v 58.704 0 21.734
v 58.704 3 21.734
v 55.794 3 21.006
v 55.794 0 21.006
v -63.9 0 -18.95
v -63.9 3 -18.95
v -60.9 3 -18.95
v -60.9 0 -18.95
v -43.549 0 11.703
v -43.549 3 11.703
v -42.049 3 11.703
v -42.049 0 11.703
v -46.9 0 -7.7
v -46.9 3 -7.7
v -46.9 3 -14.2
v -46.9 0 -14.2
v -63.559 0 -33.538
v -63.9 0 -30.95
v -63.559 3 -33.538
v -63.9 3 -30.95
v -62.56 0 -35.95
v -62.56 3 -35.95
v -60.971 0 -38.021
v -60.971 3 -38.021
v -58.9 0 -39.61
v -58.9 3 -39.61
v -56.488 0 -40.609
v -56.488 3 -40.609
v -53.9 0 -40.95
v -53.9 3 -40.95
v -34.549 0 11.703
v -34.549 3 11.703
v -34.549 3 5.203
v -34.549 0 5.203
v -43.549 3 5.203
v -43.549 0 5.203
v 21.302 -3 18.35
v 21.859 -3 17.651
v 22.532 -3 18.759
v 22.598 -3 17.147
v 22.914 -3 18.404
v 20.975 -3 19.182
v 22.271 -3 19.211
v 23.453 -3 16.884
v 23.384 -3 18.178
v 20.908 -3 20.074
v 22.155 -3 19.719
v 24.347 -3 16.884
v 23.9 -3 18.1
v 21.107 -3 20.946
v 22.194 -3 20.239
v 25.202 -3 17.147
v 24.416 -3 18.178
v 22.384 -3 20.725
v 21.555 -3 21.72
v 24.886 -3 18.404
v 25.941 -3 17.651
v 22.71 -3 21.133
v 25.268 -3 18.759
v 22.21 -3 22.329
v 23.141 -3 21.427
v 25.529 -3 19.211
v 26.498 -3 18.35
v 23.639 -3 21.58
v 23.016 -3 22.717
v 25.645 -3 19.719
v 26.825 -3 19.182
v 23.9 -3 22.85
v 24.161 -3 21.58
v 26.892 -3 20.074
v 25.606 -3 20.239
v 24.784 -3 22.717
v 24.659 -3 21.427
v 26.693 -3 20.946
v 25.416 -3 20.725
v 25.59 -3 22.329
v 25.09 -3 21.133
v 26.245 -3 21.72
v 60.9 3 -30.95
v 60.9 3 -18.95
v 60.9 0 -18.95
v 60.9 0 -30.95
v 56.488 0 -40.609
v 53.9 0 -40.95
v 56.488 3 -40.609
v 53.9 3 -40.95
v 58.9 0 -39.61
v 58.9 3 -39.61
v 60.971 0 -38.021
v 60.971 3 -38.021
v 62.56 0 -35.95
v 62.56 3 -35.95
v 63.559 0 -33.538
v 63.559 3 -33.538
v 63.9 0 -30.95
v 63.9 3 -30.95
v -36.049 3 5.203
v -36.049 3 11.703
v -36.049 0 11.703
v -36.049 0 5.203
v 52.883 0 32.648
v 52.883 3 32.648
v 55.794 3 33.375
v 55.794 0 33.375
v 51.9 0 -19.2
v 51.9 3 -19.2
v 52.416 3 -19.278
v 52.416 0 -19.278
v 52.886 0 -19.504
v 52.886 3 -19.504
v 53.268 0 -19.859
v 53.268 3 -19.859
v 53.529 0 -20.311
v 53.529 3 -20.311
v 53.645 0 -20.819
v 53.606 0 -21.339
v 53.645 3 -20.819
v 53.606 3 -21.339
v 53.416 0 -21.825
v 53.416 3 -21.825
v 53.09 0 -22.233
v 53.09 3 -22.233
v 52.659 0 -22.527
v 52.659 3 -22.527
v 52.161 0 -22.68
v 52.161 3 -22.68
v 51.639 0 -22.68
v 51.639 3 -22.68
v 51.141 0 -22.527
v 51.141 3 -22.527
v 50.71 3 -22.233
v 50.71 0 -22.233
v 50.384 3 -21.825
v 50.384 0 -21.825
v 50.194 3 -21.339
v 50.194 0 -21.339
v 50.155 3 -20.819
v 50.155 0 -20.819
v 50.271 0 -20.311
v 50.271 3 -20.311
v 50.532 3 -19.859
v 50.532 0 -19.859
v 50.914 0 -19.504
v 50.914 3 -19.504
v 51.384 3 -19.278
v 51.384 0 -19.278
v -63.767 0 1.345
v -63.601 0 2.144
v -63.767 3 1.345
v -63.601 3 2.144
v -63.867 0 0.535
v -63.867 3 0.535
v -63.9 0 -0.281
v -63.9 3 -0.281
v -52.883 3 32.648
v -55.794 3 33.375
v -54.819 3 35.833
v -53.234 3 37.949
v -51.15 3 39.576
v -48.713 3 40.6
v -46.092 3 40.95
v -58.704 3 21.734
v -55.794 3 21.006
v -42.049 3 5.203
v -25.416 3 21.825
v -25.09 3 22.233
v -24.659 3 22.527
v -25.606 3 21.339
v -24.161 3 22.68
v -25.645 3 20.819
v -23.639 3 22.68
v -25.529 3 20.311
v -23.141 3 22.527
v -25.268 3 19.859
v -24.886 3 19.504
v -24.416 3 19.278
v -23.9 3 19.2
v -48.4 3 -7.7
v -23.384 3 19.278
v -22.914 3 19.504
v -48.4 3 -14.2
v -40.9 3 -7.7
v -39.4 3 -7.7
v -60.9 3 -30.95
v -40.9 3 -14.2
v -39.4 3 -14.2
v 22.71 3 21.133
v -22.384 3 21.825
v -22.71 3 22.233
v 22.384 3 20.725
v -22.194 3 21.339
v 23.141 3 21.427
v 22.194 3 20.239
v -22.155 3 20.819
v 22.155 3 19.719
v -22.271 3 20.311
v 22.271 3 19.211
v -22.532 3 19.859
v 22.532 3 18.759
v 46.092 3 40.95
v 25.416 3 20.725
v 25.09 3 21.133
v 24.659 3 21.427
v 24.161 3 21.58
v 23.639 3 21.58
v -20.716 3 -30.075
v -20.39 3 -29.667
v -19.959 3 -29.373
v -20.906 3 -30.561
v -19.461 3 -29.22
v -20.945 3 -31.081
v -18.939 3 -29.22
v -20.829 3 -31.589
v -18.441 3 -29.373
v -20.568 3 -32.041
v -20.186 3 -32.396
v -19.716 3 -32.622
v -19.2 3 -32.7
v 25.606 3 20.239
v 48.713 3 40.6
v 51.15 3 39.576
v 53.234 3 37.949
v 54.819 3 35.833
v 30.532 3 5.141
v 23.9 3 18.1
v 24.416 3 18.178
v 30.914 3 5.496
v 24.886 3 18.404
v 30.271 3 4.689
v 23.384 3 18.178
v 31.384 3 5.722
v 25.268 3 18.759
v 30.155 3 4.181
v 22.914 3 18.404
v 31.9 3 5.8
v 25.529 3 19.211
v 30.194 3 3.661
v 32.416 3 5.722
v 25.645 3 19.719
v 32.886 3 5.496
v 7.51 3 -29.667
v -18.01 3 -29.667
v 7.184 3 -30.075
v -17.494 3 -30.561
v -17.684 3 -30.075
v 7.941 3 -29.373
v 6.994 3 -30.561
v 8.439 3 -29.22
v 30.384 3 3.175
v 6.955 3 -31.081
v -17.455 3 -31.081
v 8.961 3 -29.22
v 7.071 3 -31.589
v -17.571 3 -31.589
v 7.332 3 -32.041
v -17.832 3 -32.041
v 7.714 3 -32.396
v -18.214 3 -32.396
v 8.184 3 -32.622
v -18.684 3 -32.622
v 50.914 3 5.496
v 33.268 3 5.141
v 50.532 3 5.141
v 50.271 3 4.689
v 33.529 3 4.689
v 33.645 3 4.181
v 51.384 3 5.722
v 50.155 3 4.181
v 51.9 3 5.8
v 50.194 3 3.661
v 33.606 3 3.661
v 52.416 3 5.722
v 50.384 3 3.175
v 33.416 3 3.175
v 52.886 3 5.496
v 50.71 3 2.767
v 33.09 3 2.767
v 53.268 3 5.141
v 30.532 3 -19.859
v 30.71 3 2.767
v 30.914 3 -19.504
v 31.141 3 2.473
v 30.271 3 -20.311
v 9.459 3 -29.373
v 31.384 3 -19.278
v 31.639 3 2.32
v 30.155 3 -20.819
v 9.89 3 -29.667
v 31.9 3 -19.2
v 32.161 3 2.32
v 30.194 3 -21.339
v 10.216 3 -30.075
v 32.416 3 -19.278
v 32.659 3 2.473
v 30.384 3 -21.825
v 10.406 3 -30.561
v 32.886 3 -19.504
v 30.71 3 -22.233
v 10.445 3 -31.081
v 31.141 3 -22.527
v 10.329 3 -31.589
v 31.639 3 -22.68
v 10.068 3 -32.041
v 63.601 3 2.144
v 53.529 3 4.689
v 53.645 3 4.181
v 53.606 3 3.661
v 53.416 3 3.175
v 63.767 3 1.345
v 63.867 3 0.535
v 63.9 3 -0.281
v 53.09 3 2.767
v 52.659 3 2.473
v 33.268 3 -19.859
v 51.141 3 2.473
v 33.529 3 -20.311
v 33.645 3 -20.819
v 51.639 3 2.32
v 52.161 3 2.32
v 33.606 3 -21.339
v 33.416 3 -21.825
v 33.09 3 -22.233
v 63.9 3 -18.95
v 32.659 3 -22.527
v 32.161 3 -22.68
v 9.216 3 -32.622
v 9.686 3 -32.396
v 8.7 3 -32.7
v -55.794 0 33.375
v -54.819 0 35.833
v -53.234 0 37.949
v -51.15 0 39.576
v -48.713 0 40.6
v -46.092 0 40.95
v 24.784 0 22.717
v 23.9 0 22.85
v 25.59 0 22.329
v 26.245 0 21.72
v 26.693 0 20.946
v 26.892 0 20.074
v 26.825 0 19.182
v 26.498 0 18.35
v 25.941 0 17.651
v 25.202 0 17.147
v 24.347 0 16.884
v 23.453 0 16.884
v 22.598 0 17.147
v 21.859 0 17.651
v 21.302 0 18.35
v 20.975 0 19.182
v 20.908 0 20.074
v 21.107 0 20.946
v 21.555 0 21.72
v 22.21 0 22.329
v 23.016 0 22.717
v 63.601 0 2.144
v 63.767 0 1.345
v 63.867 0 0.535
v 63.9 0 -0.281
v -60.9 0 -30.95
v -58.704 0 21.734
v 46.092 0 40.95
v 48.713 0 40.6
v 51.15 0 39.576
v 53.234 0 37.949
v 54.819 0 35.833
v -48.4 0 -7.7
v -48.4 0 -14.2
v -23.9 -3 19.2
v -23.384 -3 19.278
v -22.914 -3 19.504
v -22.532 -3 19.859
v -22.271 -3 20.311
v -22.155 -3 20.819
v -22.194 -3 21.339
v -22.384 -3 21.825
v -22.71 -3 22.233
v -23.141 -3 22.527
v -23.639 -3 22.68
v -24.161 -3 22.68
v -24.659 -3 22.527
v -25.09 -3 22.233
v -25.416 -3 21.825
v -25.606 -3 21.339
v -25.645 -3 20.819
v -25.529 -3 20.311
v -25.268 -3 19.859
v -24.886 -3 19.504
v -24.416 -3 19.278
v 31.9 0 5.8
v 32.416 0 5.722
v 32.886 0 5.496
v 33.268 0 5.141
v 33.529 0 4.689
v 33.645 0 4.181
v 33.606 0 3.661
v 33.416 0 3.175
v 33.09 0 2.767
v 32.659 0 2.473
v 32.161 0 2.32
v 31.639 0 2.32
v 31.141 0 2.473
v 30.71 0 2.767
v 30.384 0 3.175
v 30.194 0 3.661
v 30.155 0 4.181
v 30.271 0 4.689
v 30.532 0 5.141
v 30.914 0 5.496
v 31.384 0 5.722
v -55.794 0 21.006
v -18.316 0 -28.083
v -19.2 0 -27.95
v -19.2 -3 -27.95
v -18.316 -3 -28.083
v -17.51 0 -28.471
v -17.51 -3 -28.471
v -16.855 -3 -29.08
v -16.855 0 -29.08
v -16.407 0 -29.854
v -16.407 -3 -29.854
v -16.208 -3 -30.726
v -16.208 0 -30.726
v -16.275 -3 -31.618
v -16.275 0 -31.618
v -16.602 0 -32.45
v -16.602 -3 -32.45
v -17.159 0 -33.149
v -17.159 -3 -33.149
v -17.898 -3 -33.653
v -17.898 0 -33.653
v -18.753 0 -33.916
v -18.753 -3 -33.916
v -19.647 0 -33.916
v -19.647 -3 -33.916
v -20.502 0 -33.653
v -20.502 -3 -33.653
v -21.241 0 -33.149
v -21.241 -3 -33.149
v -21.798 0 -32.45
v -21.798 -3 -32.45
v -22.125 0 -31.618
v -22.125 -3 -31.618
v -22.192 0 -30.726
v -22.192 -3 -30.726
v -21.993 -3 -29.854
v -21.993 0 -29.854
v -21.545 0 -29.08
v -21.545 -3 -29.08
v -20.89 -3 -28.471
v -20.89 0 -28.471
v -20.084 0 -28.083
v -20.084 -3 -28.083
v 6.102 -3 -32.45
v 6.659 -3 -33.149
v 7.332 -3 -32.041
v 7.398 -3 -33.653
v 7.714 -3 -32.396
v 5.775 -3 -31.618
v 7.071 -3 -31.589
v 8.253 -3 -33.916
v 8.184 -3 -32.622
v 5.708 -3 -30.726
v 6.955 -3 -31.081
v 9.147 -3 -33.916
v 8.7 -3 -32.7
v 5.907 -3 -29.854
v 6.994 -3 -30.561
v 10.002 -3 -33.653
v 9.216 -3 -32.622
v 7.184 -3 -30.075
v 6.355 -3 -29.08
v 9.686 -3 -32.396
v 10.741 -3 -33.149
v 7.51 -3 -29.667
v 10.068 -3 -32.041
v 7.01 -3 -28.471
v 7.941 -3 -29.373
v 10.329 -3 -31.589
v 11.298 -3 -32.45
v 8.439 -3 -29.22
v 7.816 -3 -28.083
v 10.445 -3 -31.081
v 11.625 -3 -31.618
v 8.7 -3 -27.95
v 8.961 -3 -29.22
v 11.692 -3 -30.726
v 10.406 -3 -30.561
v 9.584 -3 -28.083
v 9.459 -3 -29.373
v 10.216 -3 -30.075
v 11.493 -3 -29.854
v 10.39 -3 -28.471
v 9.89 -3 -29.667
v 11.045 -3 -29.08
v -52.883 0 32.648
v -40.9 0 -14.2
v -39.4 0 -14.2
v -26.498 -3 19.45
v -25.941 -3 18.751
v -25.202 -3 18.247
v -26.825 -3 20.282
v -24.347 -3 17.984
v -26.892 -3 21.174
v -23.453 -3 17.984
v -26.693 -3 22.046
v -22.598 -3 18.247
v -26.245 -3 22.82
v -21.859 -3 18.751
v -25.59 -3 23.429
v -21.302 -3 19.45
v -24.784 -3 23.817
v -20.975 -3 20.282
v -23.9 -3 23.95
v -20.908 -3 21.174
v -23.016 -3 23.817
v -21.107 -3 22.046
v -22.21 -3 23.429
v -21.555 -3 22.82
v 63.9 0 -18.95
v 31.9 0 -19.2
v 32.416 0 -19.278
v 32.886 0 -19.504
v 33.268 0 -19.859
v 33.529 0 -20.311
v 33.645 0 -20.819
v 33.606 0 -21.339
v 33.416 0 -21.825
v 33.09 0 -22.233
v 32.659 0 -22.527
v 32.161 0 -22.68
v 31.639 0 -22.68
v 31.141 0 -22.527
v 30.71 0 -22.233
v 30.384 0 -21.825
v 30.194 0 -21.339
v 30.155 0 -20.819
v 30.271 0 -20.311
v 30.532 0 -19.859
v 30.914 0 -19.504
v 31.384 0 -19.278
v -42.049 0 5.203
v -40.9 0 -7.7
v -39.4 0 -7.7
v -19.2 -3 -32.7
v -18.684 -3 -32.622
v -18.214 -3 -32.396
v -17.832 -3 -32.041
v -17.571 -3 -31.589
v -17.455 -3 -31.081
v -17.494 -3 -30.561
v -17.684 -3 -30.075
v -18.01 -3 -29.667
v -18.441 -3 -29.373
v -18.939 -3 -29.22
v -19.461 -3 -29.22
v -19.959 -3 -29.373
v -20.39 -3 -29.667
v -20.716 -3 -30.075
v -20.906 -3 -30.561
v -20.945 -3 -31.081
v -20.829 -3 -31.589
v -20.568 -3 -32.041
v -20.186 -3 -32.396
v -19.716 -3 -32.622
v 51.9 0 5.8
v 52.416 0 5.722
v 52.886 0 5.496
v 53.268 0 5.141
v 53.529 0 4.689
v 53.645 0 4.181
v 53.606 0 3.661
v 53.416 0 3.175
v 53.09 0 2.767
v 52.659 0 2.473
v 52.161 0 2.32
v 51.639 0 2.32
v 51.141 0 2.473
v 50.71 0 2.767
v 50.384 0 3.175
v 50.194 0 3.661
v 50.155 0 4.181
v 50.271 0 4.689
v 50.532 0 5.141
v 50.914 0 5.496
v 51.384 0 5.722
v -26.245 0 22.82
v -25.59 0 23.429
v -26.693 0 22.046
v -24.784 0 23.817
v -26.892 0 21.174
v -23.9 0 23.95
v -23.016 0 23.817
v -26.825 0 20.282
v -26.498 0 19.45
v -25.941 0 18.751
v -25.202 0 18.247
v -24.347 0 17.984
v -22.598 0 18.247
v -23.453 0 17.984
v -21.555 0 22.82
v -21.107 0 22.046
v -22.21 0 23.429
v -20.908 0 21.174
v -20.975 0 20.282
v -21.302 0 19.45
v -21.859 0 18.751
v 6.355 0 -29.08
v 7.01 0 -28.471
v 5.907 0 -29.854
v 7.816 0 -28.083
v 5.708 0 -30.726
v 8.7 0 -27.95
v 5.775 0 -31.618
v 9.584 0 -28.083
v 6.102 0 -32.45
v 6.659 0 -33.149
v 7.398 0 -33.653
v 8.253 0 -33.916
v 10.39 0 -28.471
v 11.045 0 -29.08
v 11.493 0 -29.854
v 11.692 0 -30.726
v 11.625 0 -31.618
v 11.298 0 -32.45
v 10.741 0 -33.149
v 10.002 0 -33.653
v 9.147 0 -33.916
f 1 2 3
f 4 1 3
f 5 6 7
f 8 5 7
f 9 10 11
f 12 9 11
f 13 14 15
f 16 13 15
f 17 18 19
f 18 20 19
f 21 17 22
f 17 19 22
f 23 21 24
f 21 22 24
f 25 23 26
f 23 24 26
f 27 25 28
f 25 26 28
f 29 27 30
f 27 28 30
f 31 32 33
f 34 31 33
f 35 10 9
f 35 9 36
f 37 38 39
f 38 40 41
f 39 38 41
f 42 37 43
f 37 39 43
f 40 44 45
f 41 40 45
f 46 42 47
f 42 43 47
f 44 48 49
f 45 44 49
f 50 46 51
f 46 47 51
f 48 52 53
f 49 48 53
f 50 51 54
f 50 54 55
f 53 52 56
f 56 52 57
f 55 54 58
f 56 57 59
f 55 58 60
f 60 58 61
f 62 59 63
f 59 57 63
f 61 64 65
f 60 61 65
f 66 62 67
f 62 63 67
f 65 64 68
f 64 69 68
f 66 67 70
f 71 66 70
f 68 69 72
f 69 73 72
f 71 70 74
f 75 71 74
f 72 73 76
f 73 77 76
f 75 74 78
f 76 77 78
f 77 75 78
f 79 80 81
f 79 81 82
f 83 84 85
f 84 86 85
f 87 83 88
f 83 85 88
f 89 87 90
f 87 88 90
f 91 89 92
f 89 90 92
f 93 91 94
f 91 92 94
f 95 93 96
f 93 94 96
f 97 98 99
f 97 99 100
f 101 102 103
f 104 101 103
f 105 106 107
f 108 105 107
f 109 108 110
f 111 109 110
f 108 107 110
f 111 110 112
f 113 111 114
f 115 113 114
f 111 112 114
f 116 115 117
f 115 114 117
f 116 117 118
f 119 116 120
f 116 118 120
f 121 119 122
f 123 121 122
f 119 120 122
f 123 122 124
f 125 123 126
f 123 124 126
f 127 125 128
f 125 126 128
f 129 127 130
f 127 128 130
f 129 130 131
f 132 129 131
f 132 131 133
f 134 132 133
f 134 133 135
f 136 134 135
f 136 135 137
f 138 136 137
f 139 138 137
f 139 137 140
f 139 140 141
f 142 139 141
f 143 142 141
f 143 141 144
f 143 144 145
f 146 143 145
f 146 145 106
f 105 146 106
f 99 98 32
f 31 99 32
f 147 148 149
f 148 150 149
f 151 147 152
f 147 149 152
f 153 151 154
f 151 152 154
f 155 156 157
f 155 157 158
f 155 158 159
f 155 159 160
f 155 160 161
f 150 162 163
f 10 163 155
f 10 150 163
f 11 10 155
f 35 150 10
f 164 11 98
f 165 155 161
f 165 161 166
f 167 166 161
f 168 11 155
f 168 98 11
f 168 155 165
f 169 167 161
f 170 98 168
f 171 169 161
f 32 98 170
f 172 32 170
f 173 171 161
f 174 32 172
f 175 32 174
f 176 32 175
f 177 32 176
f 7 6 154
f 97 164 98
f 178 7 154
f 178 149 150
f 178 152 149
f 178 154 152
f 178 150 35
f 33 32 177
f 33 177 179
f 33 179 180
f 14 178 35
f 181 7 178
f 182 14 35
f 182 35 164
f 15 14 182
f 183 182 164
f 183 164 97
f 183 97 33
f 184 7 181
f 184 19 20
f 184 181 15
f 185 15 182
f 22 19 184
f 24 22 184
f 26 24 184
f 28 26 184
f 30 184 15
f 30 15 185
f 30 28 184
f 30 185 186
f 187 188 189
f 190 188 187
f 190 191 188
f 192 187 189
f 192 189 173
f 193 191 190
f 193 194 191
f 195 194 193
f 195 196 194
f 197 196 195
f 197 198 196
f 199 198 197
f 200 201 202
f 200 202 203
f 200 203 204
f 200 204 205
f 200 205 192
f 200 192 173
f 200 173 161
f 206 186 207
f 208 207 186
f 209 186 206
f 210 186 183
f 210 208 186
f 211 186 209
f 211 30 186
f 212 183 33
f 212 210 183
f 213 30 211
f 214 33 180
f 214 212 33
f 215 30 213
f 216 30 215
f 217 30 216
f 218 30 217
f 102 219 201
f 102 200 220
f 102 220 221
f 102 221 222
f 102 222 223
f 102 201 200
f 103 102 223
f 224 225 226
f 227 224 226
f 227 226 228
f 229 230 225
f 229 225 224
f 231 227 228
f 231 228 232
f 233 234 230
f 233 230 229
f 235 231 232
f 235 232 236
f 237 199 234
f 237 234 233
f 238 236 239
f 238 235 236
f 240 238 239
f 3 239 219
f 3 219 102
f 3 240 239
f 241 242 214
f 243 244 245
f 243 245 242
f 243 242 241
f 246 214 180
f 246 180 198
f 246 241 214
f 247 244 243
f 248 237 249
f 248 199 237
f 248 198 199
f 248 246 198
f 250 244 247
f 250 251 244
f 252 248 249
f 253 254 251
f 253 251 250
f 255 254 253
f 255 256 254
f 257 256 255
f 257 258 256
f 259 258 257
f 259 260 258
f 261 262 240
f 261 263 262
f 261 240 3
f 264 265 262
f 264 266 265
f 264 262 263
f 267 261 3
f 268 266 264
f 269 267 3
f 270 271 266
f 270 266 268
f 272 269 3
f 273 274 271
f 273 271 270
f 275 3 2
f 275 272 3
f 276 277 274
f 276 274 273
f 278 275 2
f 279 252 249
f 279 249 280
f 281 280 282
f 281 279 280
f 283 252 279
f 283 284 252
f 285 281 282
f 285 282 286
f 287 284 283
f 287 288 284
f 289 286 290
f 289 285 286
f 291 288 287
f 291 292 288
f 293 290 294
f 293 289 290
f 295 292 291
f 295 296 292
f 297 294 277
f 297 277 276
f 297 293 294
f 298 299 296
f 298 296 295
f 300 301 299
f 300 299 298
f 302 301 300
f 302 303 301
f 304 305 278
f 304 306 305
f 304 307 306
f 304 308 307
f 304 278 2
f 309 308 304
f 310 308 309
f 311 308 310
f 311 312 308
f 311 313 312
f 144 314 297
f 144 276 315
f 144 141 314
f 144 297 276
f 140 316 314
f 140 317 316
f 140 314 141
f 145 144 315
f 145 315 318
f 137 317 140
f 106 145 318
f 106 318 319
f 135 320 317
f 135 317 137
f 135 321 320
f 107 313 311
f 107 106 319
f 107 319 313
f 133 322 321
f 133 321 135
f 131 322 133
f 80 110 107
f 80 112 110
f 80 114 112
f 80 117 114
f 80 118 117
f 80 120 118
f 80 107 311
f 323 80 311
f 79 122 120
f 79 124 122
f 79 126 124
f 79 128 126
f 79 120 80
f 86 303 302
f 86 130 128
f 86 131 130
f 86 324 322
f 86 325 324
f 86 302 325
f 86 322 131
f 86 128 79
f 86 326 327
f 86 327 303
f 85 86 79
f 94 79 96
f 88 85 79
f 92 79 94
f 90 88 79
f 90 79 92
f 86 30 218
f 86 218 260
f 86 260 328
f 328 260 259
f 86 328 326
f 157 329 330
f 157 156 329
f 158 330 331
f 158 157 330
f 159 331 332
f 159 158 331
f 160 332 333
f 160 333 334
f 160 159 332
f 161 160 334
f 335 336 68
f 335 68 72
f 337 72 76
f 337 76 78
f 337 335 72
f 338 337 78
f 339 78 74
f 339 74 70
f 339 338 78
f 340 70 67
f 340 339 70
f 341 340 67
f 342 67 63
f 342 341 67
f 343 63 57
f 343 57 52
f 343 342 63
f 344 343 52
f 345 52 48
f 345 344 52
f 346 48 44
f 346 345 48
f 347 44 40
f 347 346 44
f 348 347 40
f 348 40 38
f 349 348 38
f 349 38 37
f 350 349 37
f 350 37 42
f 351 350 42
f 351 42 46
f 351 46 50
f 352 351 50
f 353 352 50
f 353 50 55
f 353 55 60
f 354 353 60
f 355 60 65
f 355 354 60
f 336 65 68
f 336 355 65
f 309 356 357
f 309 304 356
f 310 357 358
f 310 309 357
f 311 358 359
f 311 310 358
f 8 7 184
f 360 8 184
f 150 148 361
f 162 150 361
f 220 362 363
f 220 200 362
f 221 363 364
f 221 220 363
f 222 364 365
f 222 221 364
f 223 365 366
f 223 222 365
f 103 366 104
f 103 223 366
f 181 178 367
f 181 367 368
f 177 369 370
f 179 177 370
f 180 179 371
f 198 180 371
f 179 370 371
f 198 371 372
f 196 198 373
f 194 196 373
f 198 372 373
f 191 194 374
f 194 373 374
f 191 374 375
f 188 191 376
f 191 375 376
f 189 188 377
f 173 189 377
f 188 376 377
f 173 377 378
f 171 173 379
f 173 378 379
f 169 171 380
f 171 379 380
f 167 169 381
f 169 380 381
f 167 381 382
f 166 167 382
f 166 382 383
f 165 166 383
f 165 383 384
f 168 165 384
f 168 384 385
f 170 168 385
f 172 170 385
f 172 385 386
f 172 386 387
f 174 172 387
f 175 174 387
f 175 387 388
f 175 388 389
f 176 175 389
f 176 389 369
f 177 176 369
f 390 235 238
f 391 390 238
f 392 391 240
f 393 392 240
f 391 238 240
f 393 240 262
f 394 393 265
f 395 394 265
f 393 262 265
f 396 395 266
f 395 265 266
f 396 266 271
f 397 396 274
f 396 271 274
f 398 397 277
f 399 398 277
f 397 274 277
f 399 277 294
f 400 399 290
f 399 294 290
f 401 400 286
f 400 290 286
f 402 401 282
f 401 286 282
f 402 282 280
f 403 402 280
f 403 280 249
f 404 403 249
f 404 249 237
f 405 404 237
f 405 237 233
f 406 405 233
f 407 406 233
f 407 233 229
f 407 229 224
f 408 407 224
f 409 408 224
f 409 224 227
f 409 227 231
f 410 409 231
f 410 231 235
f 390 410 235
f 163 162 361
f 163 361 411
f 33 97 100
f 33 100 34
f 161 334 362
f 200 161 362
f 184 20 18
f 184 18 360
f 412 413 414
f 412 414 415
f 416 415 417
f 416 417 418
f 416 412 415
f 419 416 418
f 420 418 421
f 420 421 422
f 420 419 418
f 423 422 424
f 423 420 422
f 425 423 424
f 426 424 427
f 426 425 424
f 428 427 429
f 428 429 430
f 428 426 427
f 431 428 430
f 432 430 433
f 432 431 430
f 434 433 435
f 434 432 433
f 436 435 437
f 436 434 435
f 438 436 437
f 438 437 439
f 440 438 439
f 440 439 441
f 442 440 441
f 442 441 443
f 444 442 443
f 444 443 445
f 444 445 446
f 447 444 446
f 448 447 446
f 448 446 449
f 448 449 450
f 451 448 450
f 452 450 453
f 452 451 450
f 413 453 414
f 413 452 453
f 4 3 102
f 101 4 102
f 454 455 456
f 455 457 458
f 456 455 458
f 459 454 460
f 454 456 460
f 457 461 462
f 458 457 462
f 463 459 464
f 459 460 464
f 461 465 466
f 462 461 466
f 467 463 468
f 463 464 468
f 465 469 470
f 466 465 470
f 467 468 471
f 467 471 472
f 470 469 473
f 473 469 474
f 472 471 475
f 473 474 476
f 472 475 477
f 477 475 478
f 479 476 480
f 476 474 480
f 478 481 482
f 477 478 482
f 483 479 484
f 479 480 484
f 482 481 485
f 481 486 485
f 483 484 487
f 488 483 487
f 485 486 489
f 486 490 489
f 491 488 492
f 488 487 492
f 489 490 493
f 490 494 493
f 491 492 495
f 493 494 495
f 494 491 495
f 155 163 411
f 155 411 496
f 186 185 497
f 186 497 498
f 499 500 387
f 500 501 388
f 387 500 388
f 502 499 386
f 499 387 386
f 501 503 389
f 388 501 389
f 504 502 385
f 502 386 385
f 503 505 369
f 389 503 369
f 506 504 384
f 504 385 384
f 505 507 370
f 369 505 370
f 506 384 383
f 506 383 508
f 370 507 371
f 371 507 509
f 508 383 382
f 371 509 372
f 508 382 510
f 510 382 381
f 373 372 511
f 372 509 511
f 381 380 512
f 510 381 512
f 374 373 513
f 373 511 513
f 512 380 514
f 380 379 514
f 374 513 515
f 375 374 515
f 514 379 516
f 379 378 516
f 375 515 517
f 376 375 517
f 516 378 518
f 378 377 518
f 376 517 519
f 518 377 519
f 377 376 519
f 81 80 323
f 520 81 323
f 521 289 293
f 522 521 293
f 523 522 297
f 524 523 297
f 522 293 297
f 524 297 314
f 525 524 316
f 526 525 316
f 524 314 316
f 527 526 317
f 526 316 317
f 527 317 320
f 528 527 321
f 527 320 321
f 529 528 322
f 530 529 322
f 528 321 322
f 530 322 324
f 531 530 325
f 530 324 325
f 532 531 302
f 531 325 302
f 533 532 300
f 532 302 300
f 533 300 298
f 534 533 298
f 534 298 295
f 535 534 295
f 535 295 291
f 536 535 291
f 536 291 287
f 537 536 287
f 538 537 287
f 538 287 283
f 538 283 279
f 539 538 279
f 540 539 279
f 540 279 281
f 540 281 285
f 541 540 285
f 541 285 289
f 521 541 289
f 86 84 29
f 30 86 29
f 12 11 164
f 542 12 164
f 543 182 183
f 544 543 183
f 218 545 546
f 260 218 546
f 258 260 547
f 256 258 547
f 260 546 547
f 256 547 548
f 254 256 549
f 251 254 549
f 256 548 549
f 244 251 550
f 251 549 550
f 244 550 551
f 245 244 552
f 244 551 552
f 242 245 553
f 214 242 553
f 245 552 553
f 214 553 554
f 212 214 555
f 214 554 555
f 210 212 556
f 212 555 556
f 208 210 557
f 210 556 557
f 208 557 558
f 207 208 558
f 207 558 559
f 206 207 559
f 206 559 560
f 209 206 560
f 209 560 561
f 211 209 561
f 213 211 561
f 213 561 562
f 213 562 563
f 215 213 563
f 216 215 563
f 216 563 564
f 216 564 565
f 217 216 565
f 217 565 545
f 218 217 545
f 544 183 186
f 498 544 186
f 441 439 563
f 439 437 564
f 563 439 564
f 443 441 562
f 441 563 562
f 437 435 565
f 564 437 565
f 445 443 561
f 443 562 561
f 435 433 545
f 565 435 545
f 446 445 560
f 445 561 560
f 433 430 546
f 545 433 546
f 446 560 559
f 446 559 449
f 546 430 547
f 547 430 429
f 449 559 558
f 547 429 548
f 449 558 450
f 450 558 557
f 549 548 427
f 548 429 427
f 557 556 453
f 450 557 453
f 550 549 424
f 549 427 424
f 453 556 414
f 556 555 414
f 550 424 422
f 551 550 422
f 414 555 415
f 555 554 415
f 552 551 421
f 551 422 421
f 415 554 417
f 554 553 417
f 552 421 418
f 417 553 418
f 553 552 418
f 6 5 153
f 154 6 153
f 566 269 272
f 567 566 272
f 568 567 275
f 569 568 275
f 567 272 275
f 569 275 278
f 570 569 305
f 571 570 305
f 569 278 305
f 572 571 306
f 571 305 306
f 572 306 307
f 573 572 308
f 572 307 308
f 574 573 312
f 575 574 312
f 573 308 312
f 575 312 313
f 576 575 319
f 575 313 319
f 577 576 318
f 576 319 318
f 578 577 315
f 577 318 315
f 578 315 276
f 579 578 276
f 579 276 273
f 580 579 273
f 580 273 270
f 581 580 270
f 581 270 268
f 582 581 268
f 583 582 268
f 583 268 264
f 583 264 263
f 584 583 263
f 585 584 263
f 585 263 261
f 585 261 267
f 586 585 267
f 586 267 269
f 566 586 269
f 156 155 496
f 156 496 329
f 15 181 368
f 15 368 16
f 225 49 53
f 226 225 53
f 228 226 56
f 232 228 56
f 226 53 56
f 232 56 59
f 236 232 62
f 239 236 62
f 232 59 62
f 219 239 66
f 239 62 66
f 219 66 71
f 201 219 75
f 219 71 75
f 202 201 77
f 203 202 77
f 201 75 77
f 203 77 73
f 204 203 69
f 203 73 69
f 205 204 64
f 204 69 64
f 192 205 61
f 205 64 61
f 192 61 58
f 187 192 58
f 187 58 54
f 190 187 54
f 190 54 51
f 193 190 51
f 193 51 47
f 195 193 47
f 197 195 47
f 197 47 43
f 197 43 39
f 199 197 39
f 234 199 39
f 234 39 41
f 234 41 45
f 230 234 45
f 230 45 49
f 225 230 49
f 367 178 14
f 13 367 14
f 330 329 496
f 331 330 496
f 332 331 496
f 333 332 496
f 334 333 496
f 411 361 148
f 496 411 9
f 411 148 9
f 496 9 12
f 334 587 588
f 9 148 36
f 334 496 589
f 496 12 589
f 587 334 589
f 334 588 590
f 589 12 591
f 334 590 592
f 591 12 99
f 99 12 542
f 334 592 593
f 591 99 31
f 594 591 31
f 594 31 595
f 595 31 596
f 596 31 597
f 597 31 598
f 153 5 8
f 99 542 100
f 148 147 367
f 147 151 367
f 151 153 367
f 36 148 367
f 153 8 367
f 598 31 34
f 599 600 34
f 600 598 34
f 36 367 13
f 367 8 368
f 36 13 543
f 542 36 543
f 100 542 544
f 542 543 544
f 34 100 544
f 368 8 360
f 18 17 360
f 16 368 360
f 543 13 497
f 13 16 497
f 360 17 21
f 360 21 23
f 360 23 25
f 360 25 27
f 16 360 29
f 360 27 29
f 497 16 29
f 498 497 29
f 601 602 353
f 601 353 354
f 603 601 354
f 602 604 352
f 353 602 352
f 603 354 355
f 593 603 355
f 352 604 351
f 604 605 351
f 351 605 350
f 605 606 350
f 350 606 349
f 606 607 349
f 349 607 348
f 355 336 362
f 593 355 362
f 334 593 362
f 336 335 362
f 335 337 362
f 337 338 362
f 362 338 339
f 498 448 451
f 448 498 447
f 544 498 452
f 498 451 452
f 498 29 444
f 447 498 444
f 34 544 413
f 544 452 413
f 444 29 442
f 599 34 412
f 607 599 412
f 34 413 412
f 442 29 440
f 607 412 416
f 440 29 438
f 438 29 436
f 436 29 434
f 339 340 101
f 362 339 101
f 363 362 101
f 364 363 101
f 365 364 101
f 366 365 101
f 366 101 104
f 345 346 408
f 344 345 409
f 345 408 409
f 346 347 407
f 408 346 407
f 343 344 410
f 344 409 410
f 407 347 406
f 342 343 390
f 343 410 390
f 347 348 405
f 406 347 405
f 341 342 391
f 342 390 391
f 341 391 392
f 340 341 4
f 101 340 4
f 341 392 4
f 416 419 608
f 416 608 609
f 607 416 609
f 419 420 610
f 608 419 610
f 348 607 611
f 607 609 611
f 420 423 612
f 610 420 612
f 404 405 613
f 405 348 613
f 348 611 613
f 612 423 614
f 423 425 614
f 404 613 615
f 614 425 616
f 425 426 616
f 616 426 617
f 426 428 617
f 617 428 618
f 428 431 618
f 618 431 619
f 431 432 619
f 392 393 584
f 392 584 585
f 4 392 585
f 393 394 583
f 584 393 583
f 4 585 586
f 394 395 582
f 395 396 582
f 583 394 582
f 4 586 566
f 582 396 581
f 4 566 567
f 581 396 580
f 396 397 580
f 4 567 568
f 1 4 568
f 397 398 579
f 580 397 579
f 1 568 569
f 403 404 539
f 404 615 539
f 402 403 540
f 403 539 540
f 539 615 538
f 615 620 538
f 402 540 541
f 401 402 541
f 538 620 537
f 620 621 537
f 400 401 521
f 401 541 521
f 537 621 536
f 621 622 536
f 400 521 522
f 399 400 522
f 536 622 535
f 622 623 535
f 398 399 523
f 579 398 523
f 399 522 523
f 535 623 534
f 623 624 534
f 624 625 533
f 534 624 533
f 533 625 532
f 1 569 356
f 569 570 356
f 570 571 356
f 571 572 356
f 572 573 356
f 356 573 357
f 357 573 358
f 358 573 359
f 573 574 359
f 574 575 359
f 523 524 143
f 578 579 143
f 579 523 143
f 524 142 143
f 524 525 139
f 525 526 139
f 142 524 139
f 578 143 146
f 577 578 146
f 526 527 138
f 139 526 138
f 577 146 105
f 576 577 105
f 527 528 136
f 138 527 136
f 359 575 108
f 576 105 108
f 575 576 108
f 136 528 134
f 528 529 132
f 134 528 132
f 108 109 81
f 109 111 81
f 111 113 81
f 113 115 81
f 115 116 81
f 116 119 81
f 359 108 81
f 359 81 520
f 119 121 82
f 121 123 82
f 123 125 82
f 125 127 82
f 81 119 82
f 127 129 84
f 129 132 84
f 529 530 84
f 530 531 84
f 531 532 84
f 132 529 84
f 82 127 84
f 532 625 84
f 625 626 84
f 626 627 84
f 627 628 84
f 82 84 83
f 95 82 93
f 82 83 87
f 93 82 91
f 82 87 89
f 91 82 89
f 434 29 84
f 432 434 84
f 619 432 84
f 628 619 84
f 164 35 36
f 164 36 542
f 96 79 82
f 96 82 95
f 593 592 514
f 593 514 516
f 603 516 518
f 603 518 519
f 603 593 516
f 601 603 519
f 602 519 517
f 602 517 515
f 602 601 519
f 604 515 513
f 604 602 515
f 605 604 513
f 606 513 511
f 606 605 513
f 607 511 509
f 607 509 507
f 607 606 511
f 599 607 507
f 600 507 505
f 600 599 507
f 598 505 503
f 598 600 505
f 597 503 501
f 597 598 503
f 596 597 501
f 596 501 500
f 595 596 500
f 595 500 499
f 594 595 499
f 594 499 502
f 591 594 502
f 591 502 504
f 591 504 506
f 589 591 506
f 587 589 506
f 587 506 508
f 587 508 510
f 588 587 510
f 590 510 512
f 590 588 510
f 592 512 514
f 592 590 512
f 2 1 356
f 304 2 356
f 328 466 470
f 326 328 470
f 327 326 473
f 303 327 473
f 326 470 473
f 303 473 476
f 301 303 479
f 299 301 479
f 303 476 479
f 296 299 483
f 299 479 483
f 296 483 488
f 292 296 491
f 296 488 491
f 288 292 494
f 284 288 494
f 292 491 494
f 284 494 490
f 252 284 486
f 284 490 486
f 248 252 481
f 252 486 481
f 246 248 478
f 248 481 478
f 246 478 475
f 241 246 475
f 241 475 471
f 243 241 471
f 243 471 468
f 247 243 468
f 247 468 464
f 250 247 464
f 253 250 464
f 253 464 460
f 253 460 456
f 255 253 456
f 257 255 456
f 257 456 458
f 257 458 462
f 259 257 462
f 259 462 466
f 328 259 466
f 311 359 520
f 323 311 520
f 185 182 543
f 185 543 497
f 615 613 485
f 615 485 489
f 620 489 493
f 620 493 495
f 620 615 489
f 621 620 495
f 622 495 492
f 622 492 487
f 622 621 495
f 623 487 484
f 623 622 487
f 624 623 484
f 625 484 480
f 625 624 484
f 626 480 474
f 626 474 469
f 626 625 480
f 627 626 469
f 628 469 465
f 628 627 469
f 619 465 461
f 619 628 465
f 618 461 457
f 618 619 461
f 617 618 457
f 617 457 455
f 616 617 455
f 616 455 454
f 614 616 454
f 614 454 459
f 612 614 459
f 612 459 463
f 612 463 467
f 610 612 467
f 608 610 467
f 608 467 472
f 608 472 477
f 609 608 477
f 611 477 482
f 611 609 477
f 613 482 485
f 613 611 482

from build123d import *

# Parameters (mm, degrees)
BOSS_EXTRUDE1_DEPTH = 3
SKETCH1_3_R         = 3
BOSS_EXTRUDE2_DEPTH = 3
SKETCH3_R           = 1.75
CUT_EXTRUDE1_DEPTH  = 77.132204093
FILLET1_R           = 10
SKETCH4_R           = 1.75
CUT_EXTRUDE2_DEPTH  = 77.132204093
SKETCH5_W           = 1.5
SKETCH5_H           = 6.5
CUT_EXTRUDE3_DEPTH  = 77.132204093
LPATTERN1_COUNT     = 2
LPATTERN1_PITCH     = 20
SKETCH6_W           = 3
SKETCH6_H           = 12
CUT_EXTRUDE4_DEPTH  = 77.132204093


with BuildPart() as part:
    # Sketch1 → Boss-Extrude1 (new body)
    with BuildSketch(Plane(origin=(0, 0, 0), x_dir=(1, 0, 0), z_dir=(0, 1, 0))):
        Polygon((-63.9, -0.95), (-53.9, -40.95), (53.9, -40.95), (63.9, -0.95), (63.9, 40.95), (-63.9, 40.95), align=None)
    extrude(amount=BOSS_EXTRUDE1_DEPTH)

    # Sketch1<3> → Boss-Extrude2 (add)
    with BuildSketch(Plane(origin=(0, 0, 0), x_dir=(1, 0, 0), z_dir=(0, 1, 0))):
        with Locations((-19.2, 30.95)):
            Circle(SKETCH1_3_R)
        with Locations((8.7, 30.95)):
            Circle(SKETCH1_3_R)
        with Locations((-23.9, -20.95)):
            Circle(SKETCH1_3_R)
        with Locations((23.9, -19.85)):
            Circle(SKETCH1_3_R)
    extrude(amount=-BOSS_EXTRUDE2_DEPTH)

    # Sketch3 → Cut-Extrude1 (cut, through all)
    with BuildSketch(Plane.XZ.offset(3)):
        with Locations((-23.9, 20.95)):
            Circle(SKETCH3_R)
        with Locations((23.9, 19.85)):
            Circle(SKETCH3_R)
        with Locations((8.7, -30.95)):
            Circle(SKETCH3_R)
        with Locations((-19.2, -30.95)):
            Circle(SKETCH3_R)
    extrude(amount=-CUT_EXTRUDE1_DEPTH, mode=Mode.SUBTRACT)

    # Fillet1
    fillet1_edges = [part.edges().sort_by_distance(p)[0] for p in [
        (-63.9, 1.5, -40.95),
        (63.9, 1.5, -40.95),
        (63.9, 1.5, 0.95),
        (53.9, 1.5, 40.95),
        (-63.9, 1.5, 0.95),
        (-53.9, 1.5, 40.95),
    ]]
    fillet(fillet1_edges, radius=FILLET1_R)

    # Sketch4 → Cut-Extrude2 (cut, through all)
    with BuildSketch(Plane(origin=(0, 3, 0), x_dir=(1, 0, 0), z_dir=(0, 1, 0))):
        with Locations((51.9, 20.95)):
            Circle(SKETCH4_R)
        with Locations((31.9, 20.95)):
            Circle(SKETCH4_R)
        with Locations((51.9, -4.05)):
            Circle(SKETCH4_R)
        with Locations((31.9, -4.05)):
            Circle(SKETCH4_R)
    extrude(amount=-CUT_EXTRUDE2_DEPTH, mode=Mode.SUBTRACT)

    # Sketch5 → Cut-Extrude3 (cut, through all)
    with BuildSketch(Plane(origin=(0, 3, 0), x_dir=(1, 0, 0), z_dir=(0, 1, 0))):
        with Locations((-47.65, 10.95)):
            Rectangle(SKETCH5_W, SKETCH5_H)
        with Locations((-40.15, 10.95)):
            Rectangle(SKETCH5_W, SKETCH5_H)
    cut_extrude3 = extrude(amount=-CUT_EXTRUDE3_DEPTH, mode=Mode.SUBTRACT)

    # LPattern1: Cut-Extrude3 ×2
    with Locations(*[Vector(0.24253562503633305, 0, 0.9701425001453319) * (i * LPATTERN1_PITCH) for i in range(1, LPATTERN1_COUNT)]):
        add(cut_extrude3, mode=Mode.SUBTRACT)

    # Sketch6 → Cut-Extrude4 (cut, through all)
    with BuildSketch(Plane(origin=(0, 3, 0), x_dir=(1, 0, 0), z_dir=(0, 1, 0))):
        Polygon((58.704088438, -21.733646249), (55.793660937, -21.006039374), (52.883233437, -32.647749375), (55.793660937, -33.37535625), align=None)
        with Locations((-62.4, 24.95)):
            Rectangle(SKETCH6_W, SKETCH6_H)
        Polygon((-58.704088438, -21.733646249), (-55.793660937, -21.006039374), (-52.883233437, -32.647749375), (-55.793660937, -33.37535625), align=None)
        with Locations((62.4, 24.95)):
            Rectangle(SKETCH6_W, SKETCH6_H)
    extrude(amount=-CUT_EXTRUDE4_DEPTH, mode=Mode.SUBTRACT)


solid = part.part
